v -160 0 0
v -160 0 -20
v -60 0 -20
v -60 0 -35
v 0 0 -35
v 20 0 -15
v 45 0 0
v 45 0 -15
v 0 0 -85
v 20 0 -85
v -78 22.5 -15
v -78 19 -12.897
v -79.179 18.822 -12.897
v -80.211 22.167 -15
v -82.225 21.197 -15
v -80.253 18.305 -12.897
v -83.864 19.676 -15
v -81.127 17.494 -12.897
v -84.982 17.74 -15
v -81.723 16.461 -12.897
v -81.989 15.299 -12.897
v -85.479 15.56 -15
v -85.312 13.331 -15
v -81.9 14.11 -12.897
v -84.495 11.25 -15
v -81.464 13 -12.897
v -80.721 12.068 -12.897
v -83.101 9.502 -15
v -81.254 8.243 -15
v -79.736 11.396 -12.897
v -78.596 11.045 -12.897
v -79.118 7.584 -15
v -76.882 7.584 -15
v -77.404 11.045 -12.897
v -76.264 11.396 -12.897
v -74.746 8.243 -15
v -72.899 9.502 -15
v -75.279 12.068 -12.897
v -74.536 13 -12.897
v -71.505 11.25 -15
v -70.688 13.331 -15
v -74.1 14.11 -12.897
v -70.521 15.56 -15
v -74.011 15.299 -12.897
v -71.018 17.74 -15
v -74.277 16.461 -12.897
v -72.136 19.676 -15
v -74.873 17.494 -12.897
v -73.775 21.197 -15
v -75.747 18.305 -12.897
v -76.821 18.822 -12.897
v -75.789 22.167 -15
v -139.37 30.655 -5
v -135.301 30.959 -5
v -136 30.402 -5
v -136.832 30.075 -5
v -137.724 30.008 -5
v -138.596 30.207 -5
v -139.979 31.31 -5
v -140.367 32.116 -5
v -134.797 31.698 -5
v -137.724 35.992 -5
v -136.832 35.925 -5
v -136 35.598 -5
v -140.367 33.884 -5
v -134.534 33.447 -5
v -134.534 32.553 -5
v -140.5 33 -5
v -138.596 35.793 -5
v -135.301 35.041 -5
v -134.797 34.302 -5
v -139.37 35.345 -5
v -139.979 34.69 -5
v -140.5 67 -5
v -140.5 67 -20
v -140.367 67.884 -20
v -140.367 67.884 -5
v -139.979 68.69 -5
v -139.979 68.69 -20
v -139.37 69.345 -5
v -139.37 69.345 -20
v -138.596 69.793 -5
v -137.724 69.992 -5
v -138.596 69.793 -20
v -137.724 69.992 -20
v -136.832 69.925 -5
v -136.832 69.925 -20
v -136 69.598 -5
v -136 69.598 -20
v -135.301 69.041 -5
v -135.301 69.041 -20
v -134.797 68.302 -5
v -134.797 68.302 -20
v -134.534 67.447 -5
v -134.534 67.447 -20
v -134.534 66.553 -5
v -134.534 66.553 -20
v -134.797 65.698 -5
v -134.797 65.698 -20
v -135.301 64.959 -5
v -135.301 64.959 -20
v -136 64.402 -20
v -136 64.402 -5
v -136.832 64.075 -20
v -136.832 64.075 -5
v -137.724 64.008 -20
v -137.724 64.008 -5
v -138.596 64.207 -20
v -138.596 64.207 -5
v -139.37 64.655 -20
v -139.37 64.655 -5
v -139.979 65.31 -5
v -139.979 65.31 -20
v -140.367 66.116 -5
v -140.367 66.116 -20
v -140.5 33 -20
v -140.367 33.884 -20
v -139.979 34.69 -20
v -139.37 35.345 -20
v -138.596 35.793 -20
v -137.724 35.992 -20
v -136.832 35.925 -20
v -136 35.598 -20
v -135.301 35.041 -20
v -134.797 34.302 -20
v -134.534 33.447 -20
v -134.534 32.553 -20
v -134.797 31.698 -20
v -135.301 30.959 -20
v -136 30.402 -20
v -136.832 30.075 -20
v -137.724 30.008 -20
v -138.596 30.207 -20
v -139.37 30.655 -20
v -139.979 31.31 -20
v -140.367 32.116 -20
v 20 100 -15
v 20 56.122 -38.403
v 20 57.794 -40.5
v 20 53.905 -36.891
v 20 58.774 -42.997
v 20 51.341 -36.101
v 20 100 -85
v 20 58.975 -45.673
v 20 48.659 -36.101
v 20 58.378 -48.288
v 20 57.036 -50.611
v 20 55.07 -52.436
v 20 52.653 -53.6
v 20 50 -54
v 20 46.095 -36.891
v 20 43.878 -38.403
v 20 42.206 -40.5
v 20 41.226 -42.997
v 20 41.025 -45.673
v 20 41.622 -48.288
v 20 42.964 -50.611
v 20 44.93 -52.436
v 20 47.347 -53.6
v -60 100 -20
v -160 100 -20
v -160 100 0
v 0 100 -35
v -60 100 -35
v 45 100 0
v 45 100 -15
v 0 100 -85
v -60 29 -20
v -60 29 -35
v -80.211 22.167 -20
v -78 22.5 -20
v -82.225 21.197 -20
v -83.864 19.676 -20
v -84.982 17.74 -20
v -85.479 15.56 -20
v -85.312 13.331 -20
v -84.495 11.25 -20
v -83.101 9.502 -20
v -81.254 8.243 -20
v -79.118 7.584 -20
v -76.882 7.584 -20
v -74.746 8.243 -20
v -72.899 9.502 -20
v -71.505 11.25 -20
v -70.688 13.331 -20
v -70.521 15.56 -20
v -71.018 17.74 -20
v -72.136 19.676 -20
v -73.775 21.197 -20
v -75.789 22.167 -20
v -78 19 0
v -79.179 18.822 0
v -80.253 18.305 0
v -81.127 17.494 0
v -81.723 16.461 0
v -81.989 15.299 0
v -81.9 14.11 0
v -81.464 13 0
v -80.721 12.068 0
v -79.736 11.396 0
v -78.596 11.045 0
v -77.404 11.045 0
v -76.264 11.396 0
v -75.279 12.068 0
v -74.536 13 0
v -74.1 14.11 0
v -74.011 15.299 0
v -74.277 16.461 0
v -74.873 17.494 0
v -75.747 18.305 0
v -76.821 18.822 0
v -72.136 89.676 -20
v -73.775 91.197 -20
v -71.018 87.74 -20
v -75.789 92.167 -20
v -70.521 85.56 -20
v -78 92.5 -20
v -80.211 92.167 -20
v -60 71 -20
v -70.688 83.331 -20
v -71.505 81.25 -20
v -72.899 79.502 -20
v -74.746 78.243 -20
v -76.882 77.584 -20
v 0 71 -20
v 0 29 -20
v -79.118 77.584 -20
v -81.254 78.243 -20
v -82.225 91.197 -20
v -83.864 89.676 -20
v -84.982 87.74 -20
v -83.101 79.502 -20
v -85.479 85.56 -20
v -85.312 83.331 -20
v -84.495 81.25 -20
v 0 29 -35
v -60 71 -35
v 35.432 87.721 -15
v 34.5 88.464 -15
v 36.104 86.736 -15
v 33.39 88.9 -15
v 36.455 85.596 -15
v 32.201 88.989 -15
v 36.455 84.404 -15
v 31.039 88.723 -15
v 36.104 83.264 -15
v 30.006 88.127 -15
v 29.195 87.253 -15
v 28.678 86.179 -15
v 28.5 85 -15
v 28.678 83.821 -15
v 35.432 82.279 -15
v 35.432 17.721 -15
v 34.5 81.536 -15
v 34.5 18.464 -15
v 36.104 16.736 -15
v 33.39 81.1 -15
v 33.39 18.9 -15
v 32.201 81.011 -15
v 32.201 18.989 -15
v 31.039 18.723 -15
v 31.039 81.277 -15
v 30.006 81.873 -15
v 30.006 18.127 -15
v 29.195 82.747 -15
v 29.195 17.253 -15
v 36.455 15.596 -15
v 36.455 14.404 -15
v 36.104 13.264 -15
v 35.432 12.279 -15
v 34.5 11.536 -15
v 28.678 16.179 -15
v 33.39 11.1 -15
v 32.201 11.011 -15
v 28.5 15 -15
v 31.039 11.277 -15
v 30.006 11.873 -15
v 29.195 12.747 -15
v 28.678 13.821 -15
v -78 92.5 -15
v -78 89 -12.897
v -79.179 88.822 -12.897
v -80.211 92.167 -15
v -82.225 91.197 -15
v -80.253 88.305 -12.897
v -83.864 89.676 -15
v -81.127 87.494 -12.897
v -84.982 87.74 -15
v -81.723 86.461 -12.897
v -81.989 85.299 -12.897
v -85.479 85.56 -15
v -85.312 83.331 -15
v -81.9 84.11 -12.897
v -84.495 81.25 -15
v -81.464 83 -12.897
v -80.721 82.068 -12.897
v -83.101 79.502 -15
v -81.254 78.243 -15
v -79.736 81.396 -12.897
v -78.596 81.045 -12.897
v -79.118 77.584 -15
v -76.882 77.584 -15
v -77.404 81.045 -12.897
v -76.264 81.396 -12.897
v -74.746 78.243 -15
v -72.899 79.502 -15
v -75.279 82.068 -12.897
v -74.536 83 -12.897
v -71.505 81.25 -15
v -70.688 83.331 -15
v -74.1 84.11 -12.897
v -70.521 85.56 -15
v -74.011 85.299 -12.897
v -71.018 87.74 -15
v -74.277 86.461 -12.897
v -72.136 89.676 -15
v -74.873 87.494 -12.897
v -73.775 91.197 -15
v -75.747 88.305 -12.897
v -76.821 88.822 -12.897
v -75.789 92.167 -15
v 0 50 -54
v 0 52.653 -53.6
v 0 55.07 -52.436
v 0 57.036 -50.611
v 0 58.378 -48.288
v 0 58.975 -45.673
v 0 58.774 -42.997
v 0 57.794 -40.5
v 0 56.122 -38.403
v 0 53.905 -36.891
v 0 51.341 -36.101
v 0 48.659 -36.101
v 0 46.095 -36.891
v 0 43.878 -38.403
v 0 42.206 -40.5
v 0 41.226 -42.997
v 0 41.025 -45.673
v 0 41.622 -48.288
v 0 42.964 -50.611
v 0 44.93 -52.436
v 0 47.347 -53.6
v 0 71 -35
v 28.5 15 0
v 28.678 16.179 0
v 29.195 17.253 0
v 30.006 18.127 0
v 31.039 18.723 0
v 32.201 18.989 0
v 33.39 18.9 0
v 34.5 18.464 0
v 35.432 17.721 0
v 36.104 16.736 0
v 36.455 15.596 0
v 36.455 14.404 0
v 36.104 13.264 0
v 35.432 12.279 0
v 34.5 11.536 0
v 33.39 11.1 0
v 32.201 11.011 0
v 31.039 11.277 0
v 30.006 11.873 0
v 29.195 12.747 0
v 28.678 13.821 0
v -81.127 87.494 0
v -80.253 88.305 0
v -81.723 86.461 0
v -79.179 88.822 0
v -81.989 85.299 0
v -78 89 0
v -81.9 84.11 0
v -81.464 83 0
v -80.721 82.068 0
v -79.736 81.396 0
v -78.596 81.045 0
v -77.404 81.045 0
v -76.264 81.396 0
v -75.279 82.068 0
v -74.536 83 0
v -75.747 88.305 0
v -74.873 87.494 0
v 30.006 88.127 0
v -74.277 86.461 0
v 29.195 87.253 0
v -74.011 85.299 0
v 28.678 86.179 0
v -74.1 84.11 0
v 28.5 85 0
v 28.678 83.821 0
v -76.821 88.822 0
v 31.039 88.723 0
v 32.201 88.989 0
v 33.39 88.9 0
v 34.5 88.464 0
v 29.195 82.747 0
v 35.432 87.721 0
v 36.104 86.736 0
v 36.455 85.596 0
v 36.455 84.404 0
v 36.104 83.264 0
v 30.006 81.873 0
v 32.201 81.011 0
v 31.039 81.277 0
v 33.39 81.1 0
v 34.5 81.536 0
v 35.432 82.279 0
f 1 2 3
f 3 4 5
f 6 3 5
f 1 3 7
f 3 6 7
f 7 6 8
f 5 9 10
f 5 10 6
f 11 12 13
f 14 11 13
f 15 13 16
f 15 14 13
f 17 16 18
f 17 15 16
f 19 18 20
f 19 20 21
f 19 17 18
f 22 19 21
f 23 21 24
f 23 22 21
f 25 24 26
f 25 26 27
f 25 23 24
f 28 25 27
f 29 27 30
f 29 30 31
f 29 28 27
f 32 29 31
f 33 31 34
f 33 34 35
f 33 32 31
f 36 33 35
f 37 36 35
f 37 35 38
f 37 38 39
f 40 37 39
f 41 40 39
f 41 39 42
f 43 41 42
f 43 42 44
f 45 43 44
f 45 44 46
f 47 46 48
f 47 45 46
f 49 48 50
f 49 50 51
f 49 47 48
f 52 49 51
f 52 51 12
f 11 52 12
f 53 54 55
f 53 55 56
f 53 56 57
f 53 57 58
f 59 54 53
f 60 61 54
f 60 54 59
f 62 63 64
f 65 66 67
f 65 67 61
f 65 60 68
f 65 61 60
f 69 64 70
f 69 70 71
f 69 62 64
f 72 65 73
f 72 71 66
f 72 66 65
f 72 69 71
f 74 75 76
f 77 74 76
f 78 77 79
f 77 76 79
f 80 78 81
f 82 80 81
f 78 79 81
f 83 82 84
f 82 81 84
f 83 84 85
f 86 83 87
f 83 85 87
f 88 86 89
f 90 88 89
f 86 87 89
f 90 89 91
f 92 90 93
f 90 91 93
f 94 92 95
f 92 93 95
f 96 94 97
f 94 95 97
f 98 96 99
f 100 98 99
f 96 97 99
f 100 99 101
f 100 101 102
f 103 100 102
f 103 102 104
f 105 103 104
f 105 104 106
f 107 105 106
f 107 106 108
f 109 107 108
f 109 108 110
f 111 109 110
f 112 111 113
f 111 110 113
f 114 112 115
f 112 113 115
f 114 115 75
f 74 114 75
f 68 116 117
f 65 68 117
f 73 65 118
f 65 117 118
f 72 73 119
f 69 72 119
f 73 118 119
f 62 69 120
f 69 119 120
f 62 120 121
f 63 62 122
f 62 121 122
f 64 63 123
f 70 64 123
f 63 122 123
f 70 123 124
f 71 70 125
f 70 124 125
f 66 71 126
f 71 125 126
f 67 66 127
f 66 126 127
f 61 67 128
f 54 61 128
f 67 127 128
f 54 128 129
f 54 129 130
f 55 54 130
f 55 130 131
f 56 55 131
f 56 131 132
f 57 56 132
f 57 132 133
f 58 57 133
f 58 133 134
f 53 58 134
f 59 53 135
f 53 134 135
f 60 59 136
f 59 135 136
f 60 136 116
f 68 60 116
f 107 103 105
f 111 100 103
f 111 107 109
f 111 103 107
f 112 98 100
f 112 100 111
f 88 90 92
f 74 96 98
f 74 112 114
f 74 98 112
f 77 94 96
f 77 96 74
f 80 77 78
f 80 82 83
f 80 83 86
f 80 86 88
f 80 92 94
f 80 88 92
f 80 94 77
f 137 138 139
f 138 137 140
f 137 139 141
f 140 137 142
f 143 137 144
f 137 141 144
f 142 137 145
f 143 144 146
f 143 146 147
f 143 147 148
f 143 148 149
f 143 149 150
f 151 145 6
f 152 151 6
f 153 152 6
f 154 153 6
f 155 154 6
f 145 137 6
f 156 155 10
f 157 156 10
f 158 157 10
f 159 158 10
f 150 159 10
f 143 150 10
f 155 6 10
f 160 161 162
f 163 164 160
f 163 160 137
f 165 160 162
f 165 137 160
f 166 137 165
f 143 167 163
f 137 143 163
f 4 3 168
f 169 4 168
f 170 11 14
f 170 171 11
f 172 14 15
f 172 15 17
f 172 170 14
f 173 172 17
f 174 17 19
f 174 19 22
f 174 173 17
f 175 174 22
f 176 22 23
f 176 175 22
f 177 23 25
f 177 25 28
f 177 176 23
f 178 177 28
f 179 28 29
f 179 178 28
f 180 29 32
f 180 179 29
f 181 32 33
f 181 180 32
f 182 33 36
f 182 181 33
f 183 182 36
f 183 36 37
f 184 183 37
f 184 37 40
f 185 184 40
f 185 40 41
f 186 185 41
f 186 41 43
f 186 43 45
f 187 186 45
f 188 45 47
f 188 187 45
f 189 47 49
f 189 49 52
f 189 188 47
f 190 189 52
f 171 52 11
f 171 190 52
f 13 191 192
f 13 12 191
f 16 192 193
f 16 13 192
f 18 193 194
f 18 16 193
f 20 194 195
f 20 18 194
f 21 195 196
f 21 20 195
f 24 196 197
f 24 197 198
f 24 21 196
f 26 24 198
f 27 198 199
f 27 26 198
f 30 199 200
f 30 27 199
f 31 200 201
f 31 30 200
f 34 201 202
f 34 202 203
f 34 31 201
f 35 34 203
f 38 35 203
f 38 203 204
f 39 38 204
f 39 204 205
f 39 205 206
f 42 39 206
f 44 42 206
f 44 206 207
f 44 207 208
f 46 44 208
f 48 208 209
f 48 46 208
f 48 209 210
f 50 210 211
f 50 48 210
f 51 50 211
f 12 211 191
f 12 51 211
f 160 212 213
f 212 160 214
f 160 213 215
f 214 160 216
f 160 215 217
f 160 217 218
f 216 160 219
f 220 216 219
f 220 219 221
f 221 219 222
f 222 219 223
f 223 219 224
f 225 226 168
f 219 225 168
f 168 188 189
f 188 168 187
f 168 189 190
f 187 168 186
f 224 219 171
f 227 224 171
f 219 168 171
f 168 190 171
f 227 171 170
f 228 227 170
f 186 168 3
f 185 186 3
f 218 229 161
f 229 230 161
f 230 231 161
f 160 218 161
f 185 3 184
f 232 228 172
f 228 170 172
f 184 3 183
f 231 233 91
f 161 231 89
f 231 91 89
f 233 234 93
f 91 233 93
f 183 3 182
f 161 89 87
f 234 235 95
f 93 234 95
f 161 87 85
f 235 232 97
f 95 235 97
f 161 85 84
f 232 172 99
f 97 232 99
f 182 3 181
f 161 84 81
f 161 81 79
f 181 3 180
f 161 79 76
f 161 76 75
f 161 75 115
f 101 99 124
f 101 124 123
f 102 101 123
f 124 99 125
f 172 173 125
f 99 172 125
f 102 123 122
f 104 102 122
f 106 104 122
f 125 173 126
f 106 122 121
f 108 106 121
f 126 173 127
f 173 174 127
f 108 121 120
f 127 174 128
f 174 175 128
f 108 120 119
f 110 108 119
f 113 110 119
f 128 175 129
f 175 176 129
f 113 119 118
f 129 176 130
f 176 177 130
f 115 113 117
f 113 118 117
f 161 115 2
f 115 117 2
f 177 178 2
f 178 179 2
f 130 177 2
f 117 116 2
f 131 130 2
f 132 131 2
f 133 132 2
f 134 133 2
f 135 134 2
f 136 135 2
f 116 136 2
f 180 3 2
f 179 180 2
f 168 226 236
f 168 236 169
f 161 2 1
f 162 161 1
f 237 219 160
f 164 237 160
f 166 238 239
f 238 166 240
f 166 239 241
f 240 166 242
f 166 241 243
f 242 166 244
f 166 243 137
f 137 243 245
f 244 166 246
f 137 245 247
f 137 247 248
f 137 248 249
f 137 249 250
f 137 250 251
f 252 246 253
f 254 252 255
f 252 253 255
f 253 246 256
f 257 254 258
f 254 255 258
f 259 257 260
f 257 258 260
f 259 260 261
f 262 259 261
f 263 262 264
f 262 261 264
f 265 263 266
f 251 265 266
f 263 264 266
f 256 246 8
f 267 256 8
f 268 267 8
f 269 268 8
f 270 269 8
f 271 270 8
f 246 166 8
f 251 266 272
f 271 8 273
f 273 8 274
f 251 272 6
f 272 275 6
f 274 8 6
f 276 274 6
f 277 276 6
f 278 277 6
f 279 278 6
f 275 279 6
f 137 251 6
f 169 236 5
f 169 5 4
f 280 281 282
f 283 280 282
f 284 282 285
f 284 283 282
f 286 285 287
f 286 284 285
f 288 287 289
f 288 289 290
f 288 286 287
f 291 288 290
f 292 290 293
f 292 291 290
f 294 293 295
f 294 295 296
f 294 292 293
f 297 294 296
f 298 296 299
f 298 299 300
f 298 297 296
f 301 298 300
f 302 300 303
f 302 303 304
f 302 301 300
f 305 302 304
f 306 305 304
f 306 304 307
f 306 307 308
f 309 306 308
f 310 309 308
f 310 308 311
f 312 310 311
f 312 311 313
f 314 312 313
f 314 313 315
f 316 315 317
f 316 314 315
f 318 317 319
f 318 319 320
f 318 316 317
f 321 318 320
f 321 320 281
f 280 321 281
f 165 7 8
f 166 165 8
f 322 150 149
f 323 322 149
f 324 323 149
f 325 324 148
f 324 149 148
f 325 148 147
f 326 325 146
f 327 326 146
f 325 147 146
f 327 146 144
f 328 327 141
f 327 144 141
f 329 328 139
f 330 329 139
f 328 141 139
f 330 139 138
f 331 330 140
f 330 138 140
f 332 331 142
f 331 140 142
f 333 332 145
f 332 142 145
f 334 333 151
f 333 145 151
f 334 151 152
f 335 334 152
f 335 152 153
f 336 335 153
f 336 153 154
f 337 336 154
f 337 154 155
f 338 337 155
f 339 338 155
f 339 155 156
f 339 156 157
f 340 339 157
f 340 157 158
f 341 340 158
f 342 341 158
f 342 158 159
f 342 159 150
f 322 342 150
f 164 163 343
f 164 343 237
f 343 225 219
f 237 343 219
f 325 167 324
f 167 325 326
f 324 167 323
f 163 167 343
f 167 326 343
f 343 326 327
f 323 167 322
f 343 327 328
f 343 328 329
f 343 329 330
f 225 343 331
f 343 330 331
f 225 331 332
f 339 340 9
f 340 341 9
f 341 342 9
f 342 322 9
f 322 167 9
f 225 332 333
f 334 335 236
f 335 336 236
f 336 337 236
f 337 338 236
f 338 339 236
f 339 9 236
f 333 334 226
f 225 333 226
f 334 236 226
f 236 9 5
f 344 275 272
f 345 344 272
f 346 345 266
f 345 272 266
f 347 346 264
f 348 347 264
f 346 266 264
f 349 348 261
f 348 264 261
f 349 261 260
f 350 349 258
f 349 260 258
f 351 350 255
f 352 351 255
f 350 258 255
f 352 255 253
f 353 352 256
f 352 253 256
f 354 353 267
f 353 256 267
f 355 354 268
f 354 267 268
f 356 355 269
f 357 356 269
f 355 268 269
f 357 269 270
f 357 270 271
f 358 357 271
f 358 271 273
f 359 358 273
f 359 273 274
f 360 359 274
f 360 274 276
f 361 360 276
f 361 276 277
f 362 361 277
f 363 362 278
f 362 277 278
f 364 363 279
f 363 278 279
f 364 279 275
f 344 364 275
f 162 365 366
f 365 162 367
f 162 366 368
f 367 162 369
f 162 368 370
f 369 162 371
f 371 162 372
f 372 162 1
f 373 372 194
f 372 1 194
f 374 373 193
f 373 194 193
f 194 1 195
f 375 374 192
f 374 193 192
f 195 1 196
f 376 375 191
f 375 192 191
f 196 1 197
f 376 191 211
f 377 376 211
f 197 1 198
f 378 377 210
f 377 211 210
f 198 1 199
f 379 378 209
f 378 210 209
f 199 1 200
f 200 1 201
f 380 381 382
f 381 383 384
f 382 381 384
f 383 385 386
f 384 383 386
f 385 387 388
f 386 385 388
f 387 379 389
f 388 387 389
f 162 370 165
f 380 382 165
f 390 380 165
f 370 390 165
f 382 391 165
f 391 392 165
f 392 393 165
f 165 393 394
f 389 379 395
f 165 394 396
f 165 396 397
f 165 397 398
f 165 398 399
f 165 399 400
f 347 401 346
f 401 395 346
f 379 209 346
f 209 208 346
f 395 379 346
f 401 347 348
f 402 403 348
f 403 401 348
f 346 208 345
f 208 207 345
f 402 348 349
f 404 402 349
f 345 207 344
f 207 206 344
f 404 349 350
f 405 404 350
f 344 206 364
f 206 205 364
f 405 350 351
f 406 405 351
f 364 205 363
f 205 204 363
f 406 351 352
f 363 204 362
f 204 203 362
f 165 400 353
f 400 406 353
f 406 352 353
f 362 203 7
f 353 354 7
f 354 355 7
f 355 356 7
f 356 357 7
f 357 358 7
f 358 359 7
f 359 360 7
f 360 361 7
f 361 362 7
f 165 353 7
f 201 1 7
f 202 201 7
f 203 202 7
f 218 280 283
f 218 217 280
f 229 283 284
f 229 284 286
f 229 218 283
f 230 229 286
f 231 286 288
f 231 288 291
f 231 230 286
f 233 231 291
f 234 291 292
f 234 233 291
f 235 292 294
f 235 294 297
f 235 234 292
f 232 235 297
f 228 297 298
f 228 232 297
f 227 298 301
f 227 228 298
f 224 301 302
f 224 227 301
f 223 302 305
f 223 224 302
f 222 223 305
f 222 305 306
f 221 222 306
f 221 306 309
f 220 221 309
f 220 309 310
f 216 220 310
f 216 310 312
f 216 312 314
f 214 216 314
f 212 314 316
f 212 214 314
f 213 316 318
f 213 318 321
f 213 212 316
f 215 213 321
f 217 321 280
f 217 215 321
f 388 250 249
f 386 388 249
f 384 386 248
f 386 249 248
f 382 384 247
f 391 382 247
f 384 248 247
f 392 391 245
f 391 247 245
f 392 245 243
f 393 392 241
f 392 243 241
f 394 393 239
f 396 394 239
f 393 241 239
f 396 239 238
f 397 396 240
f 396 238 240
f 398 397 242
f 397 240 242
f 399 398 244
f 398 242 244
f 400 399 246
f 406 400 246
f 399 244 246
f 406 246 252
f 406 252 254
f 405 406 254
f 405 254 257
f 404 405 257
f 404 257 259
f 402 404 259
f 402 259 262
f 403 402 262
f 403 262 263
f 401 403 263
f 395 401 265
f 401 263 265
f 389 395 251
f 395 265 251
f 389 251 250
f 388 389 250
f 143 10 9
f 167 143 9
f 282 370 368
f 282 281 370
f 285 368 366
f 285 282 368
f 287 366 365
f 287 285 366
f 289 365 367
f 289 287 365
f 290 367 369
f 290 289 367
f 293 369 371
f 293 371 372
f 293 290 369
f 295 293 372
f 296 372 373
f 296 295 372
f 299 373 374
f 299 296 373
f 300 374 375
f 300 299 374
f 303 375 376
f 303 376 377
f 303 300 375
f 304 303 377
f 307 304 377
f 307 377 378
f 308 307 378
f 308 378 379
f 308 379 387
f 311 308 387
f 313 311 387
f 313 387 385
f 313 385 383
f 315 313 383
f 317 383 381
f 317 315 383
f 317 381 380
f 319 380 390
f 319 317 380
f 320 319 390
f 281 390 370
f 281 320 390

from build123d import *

# Parameters (mm, degrees)
BOSS_EXTRUDE2_DEPTH = 100
SKETCH3_W           = 60
SKETCH3_H           = 29
BOSS_EXTRUDE3_DEPTH = 15
SKETCH4_R           = 4
CUT_EXTRUDE1_DEPTH  = 15
HOLE2_AT_2_COUNT    = 2
HOLE2_AT_2_PITCH    = 70
SKETCH9_R           = 3
CUT_EXTRUDE2_DEPTH  = 15
SKETCH10_R          = 9
CUT_EXTRUDE3_DEPTH  = 52


with BuildPart() as part:
    # Sketch1 → Boss-Extrude2 (new body)
    with BuildSketch(Plane(origin=(0, 0, 0), x_dir=(1, 0, 0), z_dir=(0, 1, 0))):
        Polygon((-160, 0), (45, 0), (45, 15), (20, 15), (20, 85), (0, 85), (0, 20), (-160, 20), align=None)
    extrude(amount=BOSS_EXTRUDE2_DEPTH)

    # Sketch3 → Boss-Extrude3 (add)
    with BuildSketch(Plane(origin=(0, 0, -20), x_dir=(-1, 0, 0), z_dir=(0, 0, -1))):
        with Locations((30, 85.5)):
            Rectangle(SKETCH3_W, SKETCH3_H)
        with Locations((30, 14.5)):
            Rectangle(SKETCH3_W, SKETCH3_H)
    extrude(amount=BOSS_EXTRUDE3_DEPTH)

    # Sketch4 → Cut-Extrude1 (cut)
    with BuildSketch(Plane(origin=(0, 0, -15), x_dir=(-1, 0, 0), z_dir=(0, 0, -1))):
        with Locations((-32.5, 85)):
            Circle(SKETCH4_R)
        with Locations((-32.5, 15)):
            Circle(SKETCH4_R)
    extrude(amount=-CUT_EXTRUDE1_DEPTH, mode=Mode.SUBTRACT)

    # Sketch8 → Hole2 (revolve, cut)
    with BuildSketch(Plane(origin=(-78, 85, -20), x_dir=(0, 1, 0), z_dir=(1, 0, 0))):
        Polygon((0, 0), (0, 20), (4, 20), (4, 7.103012167), (7.5, 5), (7.5, 0), align=None)
    hole2 = revolve(axis=Axis((-78, 85, -26.130023899), (0, 0, 1)), mode=Mode.SUBTRACT)

    # Hole2 at 2: Hole2 ×2
    with Locations(*[(0, -i * HOLE2_AT_2_PITCH, 0) for i in range(1, HOLE2_AT_2_COUNT)]):
        add(hole2, mode=Mode.SUBTRACT)

    # Sketch9 → Cut-Extrude2 (cut)
    with BuildSketch(Plane(origin=(0, 0, -20), x_dir=(-1, 0, 0), z_dir=(0, 0, -1))):
        with Locations((137.5, 67)):
            Circle(SKETCH9_R)
        with Locations((137.5, 33)):
            Circle(SKETCH9_R)
    extrude(amount=-CUT_EXTRUDE2_DEPTH, mode=Mode.SUBTRACT)

    # Sketch10 → Cut-Extrude3 (cut)
    with BuildSketch(Plane(origin=(20, 0, 0), x_dir=(0, 0, -1), z_dir=(1, 0, 0))):
        with Locations((45, 50)):
            Circle(SKETCH10_R)
    extrude(amount=-CUT_EXTRUDE3_DEPTH, mode=Mode.SUBTRACT)


solid = part.part
